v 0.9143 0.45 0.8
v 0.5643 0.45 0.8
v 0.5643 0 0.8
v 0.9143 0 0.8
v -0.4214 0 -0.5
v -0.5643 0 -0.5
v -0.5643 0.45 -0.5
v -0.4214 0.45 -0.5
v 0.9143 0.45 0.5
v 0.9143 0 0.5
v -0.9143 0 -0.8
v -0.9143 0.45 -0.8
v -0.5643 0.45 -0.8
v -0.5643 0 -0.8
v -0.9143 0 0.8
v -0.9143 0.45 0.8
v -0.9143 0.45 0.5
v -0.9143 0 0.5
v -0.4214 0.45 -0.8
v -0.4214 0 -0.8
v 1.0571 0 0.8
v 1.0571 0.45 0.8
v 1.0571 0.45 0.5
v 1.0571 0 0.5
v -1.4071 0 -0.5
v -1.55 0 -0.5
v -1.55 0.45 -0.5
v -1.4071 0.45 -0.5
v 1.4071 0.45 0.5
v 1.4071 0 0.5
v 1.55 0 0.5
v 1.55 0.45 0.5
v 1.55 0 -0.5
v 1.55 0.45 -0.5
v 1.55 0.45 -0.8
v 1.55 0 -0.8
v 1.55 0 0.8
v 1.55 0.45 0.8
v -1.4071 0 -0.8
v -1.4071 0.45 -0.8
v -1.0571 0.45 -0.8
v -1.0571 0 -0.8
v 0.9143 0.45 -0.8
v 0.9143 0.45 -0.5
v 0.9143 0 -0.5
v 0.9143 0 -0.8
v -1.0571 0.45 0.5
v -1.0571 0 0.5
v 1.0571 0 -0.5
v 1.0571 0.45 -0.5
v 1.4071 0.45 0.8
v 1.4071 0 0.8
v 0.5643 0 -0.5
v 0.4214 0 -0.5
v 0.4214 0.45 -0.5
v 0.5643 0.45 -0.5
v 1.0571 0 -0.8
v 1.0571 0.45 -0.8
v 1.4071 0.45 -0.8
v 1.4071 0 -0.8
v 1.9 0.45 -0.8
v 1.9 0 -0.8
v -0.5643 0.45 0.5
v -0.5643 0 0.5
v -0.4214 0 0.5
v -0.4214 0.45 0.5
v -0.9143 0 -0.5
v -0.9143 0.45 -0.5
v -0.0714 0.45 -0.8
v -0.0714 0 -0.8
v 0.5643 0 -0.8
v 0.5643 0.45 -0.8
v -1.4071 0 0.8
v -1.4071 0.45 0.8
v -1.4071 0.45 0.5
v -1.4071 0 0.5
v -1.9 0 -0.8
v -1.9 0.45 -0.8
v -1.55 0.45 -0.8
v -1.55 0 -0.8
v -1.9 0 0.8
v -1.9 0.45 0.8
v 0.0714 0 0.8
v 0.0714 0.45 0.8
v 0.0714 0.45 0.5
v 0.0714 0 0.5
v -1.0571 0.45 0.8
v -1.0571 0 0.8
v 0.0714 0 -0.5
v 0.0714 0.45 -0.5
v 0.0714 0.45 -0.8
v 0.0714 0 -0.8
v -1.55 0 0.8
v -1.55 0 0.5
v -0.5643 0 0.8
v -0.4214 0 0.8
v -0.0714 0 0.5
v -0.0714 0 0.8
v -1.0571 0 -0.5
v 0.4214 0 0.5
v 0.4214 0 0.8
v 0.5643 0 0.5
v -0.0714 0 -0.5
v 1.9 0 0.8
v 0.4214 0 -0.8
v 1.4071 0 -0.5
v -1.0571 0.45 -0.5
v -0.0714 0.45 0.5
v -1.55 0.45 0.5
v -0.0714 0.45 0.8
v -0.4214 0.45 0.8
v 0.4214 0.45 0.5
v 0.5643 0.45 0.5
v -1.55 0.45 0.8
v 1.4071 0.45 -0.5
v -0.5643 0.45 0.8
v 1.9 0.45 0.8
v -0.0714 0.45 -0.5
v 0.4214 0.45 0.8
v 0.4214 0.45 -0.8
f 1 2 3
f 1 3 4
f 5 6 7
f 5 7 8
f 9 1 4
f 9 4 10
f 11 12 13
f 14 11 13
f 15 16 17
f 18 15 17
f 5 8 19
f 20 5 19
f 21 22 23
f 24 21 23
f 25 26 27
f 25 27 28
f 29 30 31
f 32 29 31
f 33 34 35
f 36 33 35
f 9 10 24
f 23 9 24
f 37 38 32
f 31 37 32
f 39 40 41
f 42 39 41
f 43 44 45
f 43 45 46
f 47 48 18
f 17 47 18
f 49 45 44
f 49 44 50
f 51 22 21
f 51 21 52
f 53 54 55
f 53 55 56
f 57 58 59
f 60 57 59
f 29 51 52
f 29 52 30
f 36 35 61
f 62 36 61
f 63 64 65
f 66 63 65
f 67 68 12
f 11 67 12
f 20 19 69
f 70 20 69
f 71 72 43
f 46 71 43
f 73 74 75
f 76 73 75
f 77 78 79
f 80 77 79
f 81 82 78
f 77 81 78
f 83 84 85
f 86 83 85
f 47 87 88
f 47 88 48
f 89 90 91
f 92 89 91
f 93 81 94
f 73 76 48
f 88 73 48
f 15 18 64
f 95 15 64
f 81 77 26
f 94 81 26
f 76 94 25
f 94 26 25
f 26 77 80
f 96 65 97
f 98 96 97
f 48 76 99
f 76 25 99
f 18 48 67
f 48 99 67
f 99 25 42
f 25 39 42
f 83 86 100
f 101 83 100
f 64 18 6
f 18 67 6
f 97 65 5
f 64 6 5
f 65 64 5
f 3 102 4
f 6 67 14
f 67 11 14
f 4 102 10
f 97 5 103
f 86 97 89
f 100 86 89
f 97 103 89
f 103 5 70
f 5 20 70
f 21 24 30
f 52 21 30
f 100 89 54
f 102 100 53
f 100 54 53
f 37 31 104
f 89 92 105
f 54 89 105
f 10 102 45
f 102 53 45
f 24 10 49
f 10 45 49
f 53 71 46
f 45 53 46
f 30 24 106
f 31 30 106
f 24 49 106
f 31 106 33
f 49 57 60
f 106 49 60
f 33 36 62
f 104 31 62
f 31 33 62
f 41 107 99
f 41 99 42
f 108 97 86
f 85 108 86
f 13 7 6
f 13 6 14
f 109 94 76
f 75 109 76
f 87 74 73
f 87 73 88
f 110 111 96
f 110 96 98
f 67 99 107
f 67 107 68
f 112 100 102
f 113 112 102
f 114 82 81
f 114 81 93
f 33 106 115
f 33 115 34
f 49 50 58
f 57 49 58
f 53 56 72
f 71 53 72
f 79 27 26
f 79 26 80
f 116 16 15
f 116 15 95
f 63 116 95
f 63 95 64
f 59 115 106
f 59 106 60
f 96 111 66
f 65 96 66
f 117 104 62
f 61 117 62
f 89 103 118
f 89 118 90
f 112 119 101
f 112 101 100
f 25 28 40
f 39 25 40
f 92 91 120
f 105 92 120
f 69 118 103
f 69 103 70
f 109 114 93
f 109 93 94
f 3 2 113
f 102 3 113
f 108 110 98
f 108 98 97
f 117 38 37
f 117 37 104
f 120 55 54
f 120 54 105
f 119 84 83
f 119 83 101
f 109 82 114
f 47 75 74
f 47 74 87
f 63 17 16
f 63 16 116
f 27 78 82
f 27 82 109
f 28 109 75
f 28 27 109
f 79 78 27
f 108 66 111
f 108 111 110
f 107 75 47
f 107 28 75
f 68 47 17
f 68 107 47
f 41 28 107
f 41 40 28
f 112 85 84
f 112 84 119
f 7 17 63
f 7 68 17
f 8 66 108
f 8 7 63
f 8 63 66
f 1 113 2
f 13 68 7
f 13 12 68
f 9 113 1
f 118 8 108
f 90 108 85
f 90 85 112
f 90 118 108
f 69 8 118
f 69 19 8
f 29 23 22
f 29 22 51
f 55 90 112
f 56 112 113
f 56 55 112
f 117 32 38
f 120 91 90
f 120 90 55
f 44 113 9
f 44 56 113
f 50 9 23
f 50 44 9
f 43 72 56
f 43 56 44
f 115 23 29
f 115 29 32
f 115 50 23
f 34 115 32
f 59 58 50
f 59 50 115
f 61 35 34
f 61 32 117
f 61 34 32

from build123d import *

# Parameters (mm, degrees)
SKETCH1_W           = 3.8
SKETCH1_H           = 1
BOSS_EXTRUDE1_DEPTH = 0.45
SKETCH2_W           = 0.35
SKETCH2_H           = 0.3
BOSS_EXTRUDE2_DEPTH = 0.45


with BuildPart() as part:
    # Sketch1 → Boss-Extrude1 (new body)
    with BuildSketch(Plane(origin=(0, 0, 0), x_dir=(1, 0, 0), z_dir=(0, 1, 0))):
        Rectangle(SKETCH1_W, SKETCH1_H)
    extrude(amount=BOSS_EXTRUDE1_DEPTH)

    # Sketch2 → Boss-Extrude2 (add)
    with BuildSketch(Plane(origin=(0, 0.45, 0), x_dir=(1, 0, 0), z_dir=(0, 1, 0))):
        with Locations((-1.232142857, 0.65)):
            Rectangle(SKETCH2_W, SKETCH2_H)
        with Locations((-1.725, 0.65)):
            Rectangle(SKETCH2_W, SKETCH2_H)
        with Locations((-0.739285714, 0.65)):
            Rectangle(SKETCH2_W, SKETCH2_H)
        with Locations((-0.246428571, 0.65)):
            Rectangle(SKETCH2_W, SKETCH2_H)
        with Locations((0.246428571, 0.65)):
            Rectangle(SKETCH2_W, SKETCH2_H)
        with Locations((0.739285714, 0.65)):
            Rectangle(SKETCH2_W, SKETCH2_H)
        with Locations((1.232142857, 0.65)):
            Rectangle(SKETCH2_W, SKETCH2_H)
        with Locations((1.725, 0.65)):
            Rectangle(SKETCH2_W, SKETCH2_H)
        with Locations((1.725, -0.65)):
            Rectangle(SKETCH2_W, SKETCH2_H)
        with Locations((1.232142857, -0.65)):
            Rectangle(SKETCH2_W, SKETCH2_H)
        with Locations((0.739285714, -0.65)):
            Rectangle(SKETCH2_W, SKETCH2_H)
        with Locations((0.246428571, -0.65)):
            Rectangle(SKETCH2_W, SKETCH2_H)
        with Locations((-0.246428571, -0.65)):
            Rectangle(SKETCH2_W, SKETCH2_H)
        with Locations((-0.739285714, -0.65)):
            Rectangle(SKETCH2_W, SKETCH2_H)
        with Locations((-1.232142857, -0.65)):
            Rectangle(SKETCH2_W, SKETCH2_H)
        with Locations((-1.725, -0.65)):
            Rectangle(SKETCH2_W, SKETCH2_H)
    extrude(amount=-BOSS_EXTRUDE2_DEPTH)


solid = part.part
